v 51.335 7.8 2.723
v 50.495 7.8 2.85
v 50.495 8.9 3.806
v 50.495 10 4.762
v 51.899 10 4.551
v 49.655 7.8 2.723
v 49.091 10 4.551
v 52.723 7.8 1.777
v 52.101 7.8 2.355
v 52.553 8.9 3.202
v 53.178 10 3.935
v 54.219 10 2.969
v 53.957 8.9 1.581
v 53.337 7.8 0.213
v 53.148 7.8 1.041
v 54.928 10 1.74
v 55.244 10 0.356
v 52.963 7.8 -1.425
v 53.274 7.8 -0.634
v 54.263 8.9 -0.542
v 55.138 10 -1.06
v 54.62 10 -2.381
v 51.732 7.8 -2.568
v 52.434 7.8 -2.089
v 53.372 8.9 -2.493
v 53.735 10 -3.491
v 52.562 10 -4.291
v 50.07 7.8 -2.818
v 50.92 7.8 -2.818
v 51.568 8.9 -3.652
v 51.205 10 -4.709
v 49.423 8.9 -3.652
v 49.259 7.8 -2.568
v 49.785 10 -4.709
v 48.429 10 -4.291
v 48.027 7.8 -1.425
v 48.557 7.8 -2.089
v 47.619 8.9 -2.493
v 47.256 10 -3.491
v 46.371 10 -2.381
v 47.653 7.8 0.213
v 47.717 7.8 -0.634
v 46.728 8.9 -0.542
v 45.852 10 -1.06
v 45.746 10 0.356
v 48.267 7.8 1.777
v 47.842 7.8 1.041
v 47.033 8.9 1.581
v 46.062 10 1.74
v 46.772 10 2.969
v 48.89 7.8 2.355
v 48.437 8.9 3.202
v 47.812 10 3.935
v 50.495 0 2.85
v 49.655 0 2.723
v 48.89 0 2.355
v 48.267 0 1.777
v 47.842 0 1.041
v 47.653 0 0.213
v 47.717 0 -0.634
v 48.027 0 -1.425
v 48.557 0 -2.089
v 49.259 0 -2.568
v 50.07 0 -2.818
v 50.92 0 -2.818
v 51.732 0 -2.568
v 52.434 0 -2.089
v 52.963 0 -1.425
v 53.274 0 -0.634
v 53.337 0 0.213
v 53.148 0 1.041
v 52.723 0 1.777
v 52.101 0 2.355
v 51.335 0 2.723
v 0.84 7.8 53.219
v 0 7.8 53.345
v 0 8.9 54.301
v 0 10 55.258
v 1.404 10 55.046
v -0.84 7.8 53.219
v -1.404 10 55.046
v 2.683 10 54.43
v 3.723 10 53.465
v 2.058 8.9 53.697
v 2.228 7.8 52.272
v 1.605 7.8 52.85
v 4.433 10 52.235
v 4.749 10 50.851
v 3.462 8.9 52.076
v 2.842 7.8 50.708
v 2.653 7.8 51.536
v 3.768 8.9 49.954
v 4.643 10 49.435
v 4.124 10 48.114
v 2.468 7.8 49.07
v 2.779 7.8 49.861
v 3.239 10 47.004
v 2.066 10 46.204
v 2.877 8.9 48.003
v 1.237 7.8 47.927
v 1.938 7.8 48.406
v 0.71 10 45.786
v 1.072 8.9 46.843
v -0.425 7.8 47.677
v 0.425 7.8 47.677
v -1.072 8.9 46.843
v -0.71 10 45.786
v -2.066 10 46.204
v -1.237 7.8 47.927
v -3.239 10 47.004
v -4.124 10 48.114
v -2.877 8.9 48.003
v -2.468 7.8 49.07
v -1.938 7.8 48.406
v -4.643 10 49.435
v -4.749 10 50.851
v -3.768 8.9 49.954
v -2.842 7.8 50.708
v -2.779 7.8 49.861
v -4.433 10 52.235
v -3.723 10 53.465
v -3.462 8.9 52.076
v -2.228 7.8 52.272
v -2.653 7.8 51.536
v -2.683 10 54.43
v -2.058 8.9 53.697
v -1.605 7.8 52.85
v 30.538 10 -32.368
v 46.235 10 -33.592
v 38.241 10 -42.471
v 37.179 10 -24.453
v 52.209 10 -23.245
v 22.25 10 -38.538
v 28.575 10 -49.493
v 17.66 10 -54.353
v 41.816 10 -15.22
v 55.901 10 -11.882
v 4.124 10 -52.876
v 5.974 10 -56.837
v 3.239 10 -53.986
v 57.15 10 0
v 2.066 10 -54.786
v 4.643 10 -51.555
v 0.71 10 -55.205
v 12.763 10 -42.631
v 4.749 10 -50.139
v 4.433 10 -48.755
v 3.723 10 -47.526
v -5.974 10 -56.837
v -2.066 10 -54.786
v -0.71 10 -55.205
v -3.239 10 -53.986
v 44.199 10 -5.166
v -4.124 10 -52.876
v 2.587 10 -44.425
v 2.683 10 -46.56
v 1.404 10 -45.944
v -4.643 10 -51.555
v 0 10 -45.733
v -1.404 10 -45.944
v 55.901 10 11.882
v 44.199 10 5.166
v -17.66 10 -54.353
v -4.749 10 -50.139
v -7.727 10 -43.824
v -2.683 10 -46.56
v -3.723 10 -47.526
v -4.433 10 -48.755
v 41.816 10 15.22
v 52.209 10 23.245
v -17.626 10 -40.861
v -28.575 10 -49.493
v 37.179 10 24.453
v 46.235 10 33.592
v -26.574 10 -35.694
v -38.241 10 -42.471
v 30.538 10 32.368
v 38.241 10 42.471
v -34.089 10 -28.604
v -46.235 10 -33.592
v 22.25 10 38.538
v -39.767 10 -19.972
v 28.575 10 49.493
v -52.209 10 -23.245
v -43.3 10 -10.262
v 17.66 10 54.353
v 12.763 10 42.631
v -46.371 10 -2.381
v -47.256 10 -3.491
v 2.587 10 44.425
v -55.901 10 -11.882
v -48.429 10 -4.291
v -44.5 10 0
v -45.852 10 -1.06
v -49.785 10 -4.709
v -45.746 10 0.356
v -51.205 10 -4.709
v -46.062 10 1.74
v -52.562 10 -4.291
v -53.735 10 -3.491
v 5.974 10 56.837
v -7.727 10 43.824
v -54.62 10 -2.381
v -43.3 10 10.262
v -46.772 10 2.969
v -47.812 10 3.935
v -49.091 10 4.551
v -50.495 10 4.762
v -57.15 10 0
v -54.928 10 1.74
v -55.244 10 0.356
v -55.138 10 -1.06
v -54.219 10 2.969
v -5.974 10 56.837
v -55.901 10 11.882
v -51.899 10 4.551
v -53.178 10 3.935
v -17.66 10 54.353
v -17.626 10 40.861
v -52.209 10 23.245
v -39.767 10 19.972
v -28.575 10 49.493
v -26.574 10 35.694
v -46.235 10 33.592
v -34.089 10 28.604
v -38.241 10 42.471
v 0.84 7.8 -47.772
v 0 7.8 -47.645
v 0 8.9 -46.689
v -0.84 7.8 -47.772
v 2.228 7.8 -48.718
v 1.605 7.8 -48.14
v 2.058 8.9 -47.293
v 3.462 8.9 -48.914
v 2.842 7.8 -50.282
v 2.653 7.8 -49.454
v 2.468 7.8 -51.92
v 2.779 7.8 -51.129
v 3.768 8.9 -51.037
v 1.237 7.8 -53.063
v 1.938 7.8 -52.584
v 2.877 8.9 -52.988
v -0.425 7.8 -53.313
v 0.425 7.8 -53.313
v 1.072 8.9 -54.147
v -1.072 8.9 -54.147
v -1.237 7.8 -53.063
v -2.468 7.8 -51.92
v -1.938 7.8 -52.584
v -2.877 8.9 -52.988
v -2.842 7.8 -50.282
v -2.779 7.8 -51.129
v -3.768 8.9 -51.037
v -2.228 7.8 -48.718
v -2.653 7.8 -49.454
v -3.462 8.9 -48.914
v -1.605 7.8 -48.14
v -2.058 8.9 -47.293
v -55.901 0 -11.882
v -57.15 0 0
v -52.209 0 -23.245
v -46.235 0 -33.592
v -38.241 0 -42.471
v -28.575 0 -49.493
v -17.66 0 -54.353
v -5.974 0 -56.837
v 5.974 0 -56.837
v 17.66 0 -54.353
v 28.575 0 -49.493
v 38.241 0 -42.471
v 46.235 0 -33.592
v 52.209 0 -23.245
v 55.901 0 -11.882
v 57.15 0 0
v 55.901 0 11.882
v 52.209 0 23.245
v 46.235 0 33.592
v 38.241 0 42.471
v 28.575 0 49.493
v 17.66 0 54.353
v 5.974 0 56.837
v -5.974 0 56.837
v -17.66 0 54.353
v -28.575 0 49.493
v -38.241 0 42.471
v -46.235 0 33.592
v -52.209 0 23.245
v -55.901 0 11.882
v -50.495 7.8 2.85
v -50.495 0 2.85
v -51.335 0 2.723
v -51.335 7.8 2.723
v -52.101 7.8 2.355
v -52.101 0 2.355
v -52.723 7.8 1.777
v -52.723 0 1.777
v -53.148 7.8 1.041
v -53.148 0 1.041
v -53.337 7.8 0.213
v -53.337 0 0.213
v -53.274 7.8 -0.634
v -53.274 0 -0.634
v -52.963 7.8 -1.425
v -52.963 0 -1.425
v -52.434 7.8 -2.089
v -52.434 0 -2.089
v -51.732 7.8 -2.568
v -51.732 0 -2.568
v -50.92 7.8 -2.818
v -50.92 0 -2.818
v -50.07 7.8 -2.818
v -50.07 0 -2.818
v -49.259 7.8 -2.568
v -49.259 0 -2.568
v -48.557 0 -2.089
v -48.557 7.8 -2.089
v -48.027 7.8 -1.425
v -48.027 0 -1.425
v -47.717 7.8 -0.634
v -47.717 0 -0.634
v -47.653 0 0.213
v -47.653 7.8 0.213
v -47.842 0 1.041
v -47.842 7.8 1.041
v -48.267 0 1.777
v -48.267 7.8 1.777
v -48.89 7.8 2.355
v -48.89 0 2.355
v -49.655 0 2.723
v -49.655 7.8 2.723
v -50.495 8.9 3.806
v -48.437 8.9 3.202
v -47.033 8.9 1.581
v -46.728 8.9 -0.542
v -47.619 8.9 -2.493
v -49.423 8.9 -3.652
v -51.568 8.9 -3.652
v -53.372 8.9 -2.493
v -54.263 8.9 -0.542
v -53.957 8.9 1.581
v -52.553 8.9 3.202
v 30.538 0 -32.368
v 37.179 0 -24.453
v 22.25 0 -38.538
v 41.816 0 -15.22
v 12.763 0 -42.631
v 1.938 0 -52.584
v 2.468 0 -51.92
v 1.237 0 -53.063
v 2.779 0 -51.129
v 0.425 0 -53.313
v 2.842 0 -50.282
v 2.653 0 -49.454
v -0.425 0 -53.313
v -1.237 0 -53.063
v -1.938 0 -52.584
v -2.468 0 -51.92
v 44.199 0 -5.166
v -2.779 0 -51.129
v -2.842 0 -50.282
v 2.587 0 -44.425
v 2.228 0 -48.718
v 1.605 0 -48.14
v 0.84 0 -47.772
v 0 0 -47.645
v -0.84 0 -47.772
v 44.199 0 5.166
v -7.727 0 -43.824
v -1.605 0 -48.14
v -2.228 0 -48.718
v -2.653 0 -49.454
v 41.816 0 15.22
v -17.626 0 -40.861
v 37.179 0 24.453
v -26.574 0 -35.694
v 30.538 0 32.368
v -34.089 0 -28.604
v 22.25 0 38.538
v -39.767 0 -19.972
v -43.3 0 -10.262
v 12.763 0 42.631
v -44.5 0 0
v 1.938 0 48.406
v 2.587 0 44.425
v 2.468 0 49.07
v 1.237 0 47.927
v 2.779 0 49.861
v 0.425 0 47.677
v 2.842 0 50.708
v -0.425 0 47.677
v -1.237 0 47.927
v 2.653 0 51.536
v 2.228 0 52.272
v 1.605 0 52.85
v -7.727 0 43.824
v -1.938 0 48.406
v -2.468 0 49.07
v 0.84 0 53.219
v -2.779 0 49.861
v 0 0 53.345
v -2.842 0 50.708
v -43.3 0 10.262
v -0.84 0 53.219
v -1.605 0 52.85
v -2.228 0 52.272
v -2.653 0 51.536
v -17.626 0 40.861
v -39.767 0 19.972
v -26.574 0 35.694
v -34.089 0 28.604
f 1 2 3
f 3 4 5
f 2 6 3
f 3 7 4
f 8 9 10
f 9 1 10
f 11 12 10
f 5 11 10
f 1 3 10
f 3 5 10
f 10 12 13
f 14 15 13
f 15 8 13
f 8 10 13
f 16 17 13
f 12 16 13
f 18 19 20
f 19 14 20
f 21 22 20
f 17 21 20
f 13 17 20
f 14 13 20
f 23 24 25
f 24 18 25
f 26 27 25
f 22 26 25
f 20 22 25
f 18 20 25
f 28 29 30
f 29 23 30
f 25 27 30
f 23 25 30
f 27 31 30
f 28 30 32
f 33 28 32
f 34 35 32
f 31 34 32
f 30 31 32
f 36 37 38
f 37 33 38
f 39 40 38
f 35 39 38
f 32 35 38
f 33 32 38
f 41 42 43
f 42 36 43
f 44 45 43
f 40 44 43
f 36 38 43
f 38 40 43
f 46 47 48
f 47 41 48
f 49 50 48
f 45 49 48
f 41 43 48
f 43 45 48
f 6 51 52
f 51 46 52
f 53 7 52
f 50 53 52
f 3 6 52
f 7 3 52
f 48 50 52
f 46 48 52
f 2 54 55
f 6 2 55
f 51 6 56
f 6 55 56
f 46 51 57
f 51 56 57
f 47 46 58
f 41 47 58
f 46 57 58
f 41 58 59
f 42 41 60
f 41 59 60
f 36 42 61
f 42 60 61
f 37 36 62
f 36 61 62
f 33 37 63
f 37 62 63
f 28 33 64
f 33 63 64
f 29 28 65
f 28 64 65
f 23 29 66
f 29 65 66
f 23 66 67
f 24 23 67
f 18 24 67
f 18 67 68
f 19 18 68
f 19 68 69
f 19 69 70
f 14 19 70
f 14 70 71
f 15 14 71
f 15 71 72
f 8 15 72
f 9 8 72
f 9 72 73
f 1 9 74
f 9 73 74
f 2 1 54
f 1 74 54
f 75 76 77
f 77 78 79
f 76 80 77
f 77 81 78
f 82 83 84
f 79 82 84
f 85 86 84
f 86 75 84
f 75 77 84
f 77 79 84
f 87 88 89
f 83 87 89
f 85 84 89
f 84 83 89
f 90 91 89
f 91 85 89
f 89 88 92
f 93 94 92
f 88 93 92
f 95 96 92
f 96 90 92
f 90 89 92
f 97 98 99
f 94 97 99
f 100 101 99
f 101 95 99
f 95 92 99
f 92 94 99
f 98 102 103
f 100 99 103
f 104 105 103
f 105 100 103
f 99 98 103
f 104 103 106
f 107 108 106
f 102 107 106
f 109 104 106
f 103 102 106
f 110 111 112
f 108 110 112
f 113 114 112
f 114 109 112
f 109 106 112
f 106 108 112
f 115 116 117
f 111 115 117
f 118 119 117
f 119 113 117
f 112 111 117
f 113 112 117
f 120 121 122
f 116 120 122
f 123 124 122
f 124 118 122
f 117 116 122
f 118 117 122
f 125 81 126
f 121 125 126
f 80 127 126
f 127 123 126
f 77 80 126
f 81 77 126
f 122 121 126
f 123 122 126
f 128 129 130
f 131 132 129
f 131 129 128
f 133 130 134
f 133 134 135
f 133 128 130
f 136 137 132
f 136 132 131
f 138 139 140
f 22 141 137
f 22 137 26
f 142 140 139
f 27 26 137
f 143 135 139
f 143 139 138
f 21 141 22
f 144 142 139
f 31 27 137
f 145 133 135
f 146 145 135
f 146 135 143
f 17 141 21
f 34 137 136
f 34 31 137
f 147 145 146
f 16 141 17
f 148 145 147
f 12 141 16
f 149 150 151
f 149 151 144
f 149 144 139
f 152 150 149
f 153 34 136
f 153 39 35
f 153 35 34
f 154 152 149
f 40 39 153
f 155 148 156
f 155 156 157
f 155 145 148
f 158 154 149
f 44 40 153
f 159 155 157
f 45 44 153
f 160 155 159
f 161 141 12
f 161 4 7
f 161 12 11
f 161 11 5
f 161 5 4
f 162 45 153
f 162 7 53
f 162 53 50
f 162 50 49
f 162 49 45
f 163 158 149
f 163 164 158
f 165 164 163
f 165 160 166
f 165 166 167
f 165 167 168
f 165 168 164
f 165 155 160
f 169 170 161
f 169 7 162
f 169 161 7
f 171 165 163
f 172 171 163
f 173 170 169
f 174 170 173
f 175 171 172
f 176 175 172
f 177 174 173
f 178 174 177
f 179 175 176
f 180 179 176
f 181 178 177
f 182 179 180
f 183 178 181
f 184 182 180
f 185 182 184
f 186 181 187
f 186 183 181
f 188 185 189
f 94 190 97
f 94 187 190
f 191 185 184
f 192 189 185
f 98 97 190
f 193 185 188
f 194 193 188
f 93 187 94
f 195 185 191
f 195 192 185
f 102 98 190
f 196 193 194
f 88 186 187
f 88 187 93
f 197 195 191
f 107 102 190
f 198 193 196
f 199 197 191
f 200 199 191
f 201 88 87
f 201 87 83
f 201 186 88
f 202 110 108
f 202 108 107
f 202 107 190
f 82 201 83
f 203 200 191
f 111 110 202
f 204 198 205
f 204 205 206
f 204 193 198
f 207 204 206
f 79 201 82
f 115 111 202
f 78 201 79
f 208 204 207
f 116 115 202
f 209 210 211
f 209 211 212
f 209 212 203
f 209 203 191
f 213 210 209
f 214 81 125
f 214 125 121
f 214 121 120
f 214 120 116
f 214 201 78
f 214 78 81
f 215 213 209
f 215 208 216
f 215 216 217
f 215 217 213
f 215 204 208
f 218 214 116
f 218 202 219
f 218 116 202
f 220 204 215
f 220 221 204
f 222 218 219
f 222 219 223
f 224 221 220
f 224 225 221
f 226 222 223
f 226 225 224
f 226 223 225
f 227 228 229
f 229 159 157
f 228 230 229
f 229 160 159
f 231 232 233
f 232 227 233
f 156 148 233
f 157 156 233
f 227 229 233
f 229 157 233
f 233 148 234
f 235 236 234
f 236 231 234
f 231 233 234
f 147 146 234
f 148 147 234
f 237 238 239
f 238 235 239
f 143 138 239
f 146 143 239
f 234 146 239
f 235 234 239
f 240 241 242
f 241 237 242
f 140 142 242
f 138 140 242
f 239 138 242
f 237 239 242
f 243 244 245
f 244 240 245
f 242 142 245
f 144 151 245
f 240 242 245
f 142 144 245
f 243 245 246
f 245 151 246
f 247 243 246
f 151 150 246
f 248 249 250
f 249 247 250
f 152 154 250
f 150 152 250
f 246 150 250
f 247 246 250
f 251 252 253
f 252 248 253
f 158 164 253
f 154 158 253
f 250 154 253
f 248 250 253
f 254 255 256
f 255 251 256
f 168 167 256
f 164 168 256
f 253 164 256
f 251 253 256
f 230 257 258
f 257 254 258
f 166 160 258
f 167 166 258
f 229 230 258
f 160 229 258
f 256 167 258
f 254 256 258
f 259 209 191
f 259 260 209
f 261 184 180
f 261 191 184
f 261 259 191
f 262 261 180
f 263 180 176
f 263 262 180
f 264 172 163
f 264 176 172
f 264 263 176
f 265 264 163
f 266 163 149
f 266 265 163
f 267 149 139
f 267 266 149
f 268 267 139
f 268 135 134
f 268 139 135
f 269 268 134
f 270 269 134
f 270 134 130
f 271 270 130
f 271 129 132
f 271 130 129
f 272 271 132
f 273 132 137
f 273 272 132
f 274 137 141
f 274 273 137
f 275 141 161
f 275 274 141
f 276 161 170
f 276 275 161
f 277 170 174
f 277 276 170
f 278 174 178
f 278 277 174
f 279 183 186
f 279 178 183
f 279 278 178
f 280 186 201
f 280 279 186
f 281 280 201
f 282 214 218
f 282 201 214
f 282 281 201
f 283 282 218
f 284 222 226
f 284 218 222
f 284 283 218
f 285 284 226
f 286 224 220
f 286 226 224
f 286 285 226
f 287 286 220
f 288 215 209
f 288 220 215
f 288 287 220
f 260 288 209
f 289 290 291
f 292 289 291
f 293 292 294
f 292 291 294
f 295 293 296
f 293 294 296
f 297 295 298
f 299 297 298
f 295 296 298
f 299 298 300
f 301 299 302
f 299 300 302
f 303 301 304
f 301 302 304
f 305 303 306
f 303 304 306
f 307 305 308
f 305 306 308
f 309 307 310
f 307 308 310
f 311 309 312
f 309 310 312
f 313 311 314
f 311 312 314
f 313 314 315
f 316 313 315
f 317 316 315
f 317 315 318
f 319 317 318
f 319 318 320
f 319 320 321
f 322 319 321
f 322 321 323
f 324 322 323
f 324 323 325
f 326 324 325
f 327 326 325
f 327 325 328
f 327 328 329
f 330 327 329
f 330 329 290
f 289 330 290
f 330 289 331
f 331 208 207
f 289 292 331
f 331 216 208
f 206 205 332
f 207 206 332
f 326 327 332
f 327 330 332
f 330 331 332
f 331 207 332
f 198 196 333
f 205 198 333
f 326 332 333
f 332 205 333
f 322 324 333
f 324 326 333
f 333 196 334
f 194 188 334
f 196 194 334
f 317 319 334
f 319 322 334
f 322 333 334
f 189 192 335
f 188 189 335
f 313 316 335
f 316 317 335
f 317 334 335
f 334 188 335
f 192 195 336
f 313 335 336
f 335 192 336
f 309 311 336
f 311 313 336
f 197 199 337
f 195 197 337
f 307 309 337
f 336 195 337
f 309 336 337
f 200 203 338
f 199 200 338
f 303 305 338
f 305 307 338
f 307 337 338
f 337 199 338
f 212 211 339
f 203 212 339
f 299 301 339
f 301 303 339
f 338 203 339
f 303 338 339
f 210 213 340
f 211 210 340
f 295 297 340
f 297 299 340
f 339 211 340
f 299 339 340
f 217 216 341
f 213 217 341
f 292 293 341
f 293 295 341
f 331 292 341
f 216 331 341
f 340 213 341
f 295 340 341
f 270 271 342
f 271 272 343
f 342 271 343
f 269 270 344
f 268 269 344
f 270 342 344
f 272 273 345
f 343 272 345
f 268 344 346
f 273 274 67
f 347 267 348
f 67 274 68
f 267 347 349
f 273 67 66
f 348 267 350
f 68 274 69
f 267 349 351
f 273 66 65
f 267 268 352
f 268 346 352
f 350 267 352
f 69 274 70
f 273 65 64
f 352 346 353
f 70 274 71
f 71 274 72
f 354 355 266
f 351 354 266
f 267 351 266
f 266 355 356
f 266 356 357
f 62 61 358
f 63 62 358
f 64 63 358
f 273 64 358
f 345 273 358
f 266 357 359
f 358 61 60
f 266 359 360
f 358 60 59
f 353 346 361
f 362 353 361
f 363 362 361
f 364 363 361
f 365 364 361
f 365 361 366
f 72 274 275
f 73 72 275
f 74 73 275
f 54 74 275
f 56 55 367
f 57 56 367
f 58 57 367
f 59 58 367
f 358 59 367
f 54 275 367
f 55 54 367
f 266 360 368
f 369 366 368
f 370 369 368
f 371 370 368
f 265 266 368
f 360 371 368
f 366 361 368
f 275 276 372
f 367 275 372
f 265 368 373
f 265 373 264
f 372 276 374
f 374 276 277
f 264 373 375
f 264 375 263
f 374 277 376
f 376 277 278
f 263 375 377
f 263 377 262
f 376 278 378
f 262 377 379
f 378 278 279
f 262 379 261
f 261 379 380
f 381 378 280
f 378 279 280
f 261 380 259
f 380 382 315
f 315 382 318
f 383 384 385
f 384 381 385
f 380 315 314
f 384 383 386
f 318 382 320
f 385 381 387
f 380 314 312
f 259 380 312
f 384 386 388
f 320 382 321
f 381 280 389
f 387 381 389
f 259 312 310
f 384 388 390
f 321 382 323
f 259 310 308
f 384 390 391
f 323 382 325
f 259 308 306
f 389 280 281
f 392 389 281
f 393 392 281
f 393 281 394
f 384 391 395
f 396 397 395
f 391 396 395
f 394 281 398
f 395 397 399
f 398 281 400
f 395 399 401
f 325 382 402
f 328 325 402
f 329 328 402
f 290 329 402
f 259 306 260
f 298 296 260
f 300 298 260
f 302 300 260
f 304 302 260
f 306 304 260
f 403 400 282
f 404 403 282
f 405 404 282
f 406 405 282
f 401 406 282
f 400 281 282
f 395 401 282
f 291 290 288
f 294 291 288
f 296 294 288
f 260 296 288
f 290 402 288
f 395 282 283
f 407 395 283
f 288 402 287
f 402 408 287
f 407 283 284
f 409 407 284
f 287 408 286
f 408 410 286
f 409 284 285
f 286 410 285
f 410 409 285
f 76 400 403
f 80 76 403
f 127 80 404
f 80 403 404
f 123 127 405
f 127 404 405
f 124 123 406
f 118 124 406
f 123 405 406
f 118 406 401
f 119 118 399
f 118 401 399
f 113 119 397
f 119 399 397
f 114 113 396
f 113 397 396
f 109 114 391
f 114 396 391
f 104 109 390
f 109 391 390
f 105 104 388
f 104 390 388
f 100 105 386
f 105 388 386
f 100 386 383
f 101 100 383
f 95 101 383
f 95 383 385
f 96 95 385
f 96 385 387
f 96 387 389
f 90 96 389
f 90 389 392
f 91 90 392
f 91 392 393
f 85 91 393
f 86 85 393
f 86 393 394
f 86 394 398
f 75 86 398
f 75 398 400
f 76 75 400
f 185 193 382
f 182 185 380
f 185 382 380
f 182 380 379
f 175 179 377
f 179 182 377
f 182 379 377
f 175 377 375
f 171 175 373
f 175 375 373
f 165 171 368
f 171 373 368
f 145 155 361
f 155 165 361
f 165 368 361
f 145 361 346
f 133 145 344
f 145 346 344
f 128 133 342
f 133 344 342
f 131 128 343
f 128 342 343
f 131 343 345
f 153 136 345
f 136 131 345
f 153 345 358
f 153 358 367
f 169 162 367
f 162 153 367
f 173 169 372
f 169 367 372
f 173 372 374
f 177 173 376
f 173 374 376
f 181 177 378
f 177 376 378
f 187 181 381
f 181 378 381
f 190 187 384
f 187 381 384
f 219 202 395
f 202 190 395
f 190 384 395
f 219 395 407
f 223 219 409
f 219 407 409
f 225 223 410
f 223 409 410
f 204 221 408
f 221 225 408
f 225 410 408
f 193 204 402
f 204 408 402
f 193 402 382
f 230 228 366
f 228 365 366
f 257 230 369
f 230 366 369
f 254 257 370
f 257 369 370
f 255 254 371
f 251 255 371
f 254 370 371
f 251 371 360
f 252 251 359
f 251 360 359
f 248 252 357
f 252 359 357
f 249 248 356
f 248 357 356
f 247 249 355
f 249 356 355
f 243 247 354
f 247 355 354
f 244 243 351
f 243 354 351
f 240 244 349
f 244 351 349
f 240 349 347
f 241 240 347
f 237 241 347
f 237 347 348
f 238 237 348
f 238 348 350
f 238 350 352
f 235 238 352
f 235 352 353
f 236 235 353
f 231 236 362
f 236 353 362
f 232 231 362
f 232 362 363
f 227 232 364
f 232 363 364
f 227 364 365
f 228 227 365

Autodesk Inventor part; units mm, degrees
ref_plane "YZ Plane" through (0, 0, 0) normal (1, 0, 0) x (0, 1, 0)
ref_plane "XZ Plane" through (0, 0, 0) normal (0, 1, 0) x (-1, 0, 0)
ref_plane "XY Plane" through (0, 0, 0) normal (0, 0, 1) x (1, 0, 0)
sketch "Sketch1" plane through (0, 0, 0) normal (0, 1, 0) x (-1, 0, 0)
  circle A0 centre (0, 0) radius 57.15
  circle A1 centre (0, 0) radius 44.5
  dimension "d0" = 114.3
  dimension "d1" = 89
extrude "Extrusion1" add sketch "Sketch1" along normal blind 10
sketch "Sketch3" plane through (0, 10, 0) normal (0, 1, 0) x (1, 0, 0)
  line L0 (0, 0) -> (0, -50.4952)
  point P0 (50.4952, 0)
  point P1 (50.4952, 0)
  point P2 (0, 50.4952)
  point P3 (0, 50.4952)
  point P4 (-50.4952, 0)
  point P5 (-50.4952, 0)
  dimension "d18" = 50.4952
  dimension "d21" = 360
hole "Hole1" at (0, 10, 50.4952) at (50.4952, 10, 0) at (0, 10, -50.4952) at (-50.4952, 10, 0) direction (0, -1, 0) diameter 5.7 depth 15.6718 tip angle 118 countersink diameter 9.525 countersink angle 82
properties part number "innerbearingwheel"
